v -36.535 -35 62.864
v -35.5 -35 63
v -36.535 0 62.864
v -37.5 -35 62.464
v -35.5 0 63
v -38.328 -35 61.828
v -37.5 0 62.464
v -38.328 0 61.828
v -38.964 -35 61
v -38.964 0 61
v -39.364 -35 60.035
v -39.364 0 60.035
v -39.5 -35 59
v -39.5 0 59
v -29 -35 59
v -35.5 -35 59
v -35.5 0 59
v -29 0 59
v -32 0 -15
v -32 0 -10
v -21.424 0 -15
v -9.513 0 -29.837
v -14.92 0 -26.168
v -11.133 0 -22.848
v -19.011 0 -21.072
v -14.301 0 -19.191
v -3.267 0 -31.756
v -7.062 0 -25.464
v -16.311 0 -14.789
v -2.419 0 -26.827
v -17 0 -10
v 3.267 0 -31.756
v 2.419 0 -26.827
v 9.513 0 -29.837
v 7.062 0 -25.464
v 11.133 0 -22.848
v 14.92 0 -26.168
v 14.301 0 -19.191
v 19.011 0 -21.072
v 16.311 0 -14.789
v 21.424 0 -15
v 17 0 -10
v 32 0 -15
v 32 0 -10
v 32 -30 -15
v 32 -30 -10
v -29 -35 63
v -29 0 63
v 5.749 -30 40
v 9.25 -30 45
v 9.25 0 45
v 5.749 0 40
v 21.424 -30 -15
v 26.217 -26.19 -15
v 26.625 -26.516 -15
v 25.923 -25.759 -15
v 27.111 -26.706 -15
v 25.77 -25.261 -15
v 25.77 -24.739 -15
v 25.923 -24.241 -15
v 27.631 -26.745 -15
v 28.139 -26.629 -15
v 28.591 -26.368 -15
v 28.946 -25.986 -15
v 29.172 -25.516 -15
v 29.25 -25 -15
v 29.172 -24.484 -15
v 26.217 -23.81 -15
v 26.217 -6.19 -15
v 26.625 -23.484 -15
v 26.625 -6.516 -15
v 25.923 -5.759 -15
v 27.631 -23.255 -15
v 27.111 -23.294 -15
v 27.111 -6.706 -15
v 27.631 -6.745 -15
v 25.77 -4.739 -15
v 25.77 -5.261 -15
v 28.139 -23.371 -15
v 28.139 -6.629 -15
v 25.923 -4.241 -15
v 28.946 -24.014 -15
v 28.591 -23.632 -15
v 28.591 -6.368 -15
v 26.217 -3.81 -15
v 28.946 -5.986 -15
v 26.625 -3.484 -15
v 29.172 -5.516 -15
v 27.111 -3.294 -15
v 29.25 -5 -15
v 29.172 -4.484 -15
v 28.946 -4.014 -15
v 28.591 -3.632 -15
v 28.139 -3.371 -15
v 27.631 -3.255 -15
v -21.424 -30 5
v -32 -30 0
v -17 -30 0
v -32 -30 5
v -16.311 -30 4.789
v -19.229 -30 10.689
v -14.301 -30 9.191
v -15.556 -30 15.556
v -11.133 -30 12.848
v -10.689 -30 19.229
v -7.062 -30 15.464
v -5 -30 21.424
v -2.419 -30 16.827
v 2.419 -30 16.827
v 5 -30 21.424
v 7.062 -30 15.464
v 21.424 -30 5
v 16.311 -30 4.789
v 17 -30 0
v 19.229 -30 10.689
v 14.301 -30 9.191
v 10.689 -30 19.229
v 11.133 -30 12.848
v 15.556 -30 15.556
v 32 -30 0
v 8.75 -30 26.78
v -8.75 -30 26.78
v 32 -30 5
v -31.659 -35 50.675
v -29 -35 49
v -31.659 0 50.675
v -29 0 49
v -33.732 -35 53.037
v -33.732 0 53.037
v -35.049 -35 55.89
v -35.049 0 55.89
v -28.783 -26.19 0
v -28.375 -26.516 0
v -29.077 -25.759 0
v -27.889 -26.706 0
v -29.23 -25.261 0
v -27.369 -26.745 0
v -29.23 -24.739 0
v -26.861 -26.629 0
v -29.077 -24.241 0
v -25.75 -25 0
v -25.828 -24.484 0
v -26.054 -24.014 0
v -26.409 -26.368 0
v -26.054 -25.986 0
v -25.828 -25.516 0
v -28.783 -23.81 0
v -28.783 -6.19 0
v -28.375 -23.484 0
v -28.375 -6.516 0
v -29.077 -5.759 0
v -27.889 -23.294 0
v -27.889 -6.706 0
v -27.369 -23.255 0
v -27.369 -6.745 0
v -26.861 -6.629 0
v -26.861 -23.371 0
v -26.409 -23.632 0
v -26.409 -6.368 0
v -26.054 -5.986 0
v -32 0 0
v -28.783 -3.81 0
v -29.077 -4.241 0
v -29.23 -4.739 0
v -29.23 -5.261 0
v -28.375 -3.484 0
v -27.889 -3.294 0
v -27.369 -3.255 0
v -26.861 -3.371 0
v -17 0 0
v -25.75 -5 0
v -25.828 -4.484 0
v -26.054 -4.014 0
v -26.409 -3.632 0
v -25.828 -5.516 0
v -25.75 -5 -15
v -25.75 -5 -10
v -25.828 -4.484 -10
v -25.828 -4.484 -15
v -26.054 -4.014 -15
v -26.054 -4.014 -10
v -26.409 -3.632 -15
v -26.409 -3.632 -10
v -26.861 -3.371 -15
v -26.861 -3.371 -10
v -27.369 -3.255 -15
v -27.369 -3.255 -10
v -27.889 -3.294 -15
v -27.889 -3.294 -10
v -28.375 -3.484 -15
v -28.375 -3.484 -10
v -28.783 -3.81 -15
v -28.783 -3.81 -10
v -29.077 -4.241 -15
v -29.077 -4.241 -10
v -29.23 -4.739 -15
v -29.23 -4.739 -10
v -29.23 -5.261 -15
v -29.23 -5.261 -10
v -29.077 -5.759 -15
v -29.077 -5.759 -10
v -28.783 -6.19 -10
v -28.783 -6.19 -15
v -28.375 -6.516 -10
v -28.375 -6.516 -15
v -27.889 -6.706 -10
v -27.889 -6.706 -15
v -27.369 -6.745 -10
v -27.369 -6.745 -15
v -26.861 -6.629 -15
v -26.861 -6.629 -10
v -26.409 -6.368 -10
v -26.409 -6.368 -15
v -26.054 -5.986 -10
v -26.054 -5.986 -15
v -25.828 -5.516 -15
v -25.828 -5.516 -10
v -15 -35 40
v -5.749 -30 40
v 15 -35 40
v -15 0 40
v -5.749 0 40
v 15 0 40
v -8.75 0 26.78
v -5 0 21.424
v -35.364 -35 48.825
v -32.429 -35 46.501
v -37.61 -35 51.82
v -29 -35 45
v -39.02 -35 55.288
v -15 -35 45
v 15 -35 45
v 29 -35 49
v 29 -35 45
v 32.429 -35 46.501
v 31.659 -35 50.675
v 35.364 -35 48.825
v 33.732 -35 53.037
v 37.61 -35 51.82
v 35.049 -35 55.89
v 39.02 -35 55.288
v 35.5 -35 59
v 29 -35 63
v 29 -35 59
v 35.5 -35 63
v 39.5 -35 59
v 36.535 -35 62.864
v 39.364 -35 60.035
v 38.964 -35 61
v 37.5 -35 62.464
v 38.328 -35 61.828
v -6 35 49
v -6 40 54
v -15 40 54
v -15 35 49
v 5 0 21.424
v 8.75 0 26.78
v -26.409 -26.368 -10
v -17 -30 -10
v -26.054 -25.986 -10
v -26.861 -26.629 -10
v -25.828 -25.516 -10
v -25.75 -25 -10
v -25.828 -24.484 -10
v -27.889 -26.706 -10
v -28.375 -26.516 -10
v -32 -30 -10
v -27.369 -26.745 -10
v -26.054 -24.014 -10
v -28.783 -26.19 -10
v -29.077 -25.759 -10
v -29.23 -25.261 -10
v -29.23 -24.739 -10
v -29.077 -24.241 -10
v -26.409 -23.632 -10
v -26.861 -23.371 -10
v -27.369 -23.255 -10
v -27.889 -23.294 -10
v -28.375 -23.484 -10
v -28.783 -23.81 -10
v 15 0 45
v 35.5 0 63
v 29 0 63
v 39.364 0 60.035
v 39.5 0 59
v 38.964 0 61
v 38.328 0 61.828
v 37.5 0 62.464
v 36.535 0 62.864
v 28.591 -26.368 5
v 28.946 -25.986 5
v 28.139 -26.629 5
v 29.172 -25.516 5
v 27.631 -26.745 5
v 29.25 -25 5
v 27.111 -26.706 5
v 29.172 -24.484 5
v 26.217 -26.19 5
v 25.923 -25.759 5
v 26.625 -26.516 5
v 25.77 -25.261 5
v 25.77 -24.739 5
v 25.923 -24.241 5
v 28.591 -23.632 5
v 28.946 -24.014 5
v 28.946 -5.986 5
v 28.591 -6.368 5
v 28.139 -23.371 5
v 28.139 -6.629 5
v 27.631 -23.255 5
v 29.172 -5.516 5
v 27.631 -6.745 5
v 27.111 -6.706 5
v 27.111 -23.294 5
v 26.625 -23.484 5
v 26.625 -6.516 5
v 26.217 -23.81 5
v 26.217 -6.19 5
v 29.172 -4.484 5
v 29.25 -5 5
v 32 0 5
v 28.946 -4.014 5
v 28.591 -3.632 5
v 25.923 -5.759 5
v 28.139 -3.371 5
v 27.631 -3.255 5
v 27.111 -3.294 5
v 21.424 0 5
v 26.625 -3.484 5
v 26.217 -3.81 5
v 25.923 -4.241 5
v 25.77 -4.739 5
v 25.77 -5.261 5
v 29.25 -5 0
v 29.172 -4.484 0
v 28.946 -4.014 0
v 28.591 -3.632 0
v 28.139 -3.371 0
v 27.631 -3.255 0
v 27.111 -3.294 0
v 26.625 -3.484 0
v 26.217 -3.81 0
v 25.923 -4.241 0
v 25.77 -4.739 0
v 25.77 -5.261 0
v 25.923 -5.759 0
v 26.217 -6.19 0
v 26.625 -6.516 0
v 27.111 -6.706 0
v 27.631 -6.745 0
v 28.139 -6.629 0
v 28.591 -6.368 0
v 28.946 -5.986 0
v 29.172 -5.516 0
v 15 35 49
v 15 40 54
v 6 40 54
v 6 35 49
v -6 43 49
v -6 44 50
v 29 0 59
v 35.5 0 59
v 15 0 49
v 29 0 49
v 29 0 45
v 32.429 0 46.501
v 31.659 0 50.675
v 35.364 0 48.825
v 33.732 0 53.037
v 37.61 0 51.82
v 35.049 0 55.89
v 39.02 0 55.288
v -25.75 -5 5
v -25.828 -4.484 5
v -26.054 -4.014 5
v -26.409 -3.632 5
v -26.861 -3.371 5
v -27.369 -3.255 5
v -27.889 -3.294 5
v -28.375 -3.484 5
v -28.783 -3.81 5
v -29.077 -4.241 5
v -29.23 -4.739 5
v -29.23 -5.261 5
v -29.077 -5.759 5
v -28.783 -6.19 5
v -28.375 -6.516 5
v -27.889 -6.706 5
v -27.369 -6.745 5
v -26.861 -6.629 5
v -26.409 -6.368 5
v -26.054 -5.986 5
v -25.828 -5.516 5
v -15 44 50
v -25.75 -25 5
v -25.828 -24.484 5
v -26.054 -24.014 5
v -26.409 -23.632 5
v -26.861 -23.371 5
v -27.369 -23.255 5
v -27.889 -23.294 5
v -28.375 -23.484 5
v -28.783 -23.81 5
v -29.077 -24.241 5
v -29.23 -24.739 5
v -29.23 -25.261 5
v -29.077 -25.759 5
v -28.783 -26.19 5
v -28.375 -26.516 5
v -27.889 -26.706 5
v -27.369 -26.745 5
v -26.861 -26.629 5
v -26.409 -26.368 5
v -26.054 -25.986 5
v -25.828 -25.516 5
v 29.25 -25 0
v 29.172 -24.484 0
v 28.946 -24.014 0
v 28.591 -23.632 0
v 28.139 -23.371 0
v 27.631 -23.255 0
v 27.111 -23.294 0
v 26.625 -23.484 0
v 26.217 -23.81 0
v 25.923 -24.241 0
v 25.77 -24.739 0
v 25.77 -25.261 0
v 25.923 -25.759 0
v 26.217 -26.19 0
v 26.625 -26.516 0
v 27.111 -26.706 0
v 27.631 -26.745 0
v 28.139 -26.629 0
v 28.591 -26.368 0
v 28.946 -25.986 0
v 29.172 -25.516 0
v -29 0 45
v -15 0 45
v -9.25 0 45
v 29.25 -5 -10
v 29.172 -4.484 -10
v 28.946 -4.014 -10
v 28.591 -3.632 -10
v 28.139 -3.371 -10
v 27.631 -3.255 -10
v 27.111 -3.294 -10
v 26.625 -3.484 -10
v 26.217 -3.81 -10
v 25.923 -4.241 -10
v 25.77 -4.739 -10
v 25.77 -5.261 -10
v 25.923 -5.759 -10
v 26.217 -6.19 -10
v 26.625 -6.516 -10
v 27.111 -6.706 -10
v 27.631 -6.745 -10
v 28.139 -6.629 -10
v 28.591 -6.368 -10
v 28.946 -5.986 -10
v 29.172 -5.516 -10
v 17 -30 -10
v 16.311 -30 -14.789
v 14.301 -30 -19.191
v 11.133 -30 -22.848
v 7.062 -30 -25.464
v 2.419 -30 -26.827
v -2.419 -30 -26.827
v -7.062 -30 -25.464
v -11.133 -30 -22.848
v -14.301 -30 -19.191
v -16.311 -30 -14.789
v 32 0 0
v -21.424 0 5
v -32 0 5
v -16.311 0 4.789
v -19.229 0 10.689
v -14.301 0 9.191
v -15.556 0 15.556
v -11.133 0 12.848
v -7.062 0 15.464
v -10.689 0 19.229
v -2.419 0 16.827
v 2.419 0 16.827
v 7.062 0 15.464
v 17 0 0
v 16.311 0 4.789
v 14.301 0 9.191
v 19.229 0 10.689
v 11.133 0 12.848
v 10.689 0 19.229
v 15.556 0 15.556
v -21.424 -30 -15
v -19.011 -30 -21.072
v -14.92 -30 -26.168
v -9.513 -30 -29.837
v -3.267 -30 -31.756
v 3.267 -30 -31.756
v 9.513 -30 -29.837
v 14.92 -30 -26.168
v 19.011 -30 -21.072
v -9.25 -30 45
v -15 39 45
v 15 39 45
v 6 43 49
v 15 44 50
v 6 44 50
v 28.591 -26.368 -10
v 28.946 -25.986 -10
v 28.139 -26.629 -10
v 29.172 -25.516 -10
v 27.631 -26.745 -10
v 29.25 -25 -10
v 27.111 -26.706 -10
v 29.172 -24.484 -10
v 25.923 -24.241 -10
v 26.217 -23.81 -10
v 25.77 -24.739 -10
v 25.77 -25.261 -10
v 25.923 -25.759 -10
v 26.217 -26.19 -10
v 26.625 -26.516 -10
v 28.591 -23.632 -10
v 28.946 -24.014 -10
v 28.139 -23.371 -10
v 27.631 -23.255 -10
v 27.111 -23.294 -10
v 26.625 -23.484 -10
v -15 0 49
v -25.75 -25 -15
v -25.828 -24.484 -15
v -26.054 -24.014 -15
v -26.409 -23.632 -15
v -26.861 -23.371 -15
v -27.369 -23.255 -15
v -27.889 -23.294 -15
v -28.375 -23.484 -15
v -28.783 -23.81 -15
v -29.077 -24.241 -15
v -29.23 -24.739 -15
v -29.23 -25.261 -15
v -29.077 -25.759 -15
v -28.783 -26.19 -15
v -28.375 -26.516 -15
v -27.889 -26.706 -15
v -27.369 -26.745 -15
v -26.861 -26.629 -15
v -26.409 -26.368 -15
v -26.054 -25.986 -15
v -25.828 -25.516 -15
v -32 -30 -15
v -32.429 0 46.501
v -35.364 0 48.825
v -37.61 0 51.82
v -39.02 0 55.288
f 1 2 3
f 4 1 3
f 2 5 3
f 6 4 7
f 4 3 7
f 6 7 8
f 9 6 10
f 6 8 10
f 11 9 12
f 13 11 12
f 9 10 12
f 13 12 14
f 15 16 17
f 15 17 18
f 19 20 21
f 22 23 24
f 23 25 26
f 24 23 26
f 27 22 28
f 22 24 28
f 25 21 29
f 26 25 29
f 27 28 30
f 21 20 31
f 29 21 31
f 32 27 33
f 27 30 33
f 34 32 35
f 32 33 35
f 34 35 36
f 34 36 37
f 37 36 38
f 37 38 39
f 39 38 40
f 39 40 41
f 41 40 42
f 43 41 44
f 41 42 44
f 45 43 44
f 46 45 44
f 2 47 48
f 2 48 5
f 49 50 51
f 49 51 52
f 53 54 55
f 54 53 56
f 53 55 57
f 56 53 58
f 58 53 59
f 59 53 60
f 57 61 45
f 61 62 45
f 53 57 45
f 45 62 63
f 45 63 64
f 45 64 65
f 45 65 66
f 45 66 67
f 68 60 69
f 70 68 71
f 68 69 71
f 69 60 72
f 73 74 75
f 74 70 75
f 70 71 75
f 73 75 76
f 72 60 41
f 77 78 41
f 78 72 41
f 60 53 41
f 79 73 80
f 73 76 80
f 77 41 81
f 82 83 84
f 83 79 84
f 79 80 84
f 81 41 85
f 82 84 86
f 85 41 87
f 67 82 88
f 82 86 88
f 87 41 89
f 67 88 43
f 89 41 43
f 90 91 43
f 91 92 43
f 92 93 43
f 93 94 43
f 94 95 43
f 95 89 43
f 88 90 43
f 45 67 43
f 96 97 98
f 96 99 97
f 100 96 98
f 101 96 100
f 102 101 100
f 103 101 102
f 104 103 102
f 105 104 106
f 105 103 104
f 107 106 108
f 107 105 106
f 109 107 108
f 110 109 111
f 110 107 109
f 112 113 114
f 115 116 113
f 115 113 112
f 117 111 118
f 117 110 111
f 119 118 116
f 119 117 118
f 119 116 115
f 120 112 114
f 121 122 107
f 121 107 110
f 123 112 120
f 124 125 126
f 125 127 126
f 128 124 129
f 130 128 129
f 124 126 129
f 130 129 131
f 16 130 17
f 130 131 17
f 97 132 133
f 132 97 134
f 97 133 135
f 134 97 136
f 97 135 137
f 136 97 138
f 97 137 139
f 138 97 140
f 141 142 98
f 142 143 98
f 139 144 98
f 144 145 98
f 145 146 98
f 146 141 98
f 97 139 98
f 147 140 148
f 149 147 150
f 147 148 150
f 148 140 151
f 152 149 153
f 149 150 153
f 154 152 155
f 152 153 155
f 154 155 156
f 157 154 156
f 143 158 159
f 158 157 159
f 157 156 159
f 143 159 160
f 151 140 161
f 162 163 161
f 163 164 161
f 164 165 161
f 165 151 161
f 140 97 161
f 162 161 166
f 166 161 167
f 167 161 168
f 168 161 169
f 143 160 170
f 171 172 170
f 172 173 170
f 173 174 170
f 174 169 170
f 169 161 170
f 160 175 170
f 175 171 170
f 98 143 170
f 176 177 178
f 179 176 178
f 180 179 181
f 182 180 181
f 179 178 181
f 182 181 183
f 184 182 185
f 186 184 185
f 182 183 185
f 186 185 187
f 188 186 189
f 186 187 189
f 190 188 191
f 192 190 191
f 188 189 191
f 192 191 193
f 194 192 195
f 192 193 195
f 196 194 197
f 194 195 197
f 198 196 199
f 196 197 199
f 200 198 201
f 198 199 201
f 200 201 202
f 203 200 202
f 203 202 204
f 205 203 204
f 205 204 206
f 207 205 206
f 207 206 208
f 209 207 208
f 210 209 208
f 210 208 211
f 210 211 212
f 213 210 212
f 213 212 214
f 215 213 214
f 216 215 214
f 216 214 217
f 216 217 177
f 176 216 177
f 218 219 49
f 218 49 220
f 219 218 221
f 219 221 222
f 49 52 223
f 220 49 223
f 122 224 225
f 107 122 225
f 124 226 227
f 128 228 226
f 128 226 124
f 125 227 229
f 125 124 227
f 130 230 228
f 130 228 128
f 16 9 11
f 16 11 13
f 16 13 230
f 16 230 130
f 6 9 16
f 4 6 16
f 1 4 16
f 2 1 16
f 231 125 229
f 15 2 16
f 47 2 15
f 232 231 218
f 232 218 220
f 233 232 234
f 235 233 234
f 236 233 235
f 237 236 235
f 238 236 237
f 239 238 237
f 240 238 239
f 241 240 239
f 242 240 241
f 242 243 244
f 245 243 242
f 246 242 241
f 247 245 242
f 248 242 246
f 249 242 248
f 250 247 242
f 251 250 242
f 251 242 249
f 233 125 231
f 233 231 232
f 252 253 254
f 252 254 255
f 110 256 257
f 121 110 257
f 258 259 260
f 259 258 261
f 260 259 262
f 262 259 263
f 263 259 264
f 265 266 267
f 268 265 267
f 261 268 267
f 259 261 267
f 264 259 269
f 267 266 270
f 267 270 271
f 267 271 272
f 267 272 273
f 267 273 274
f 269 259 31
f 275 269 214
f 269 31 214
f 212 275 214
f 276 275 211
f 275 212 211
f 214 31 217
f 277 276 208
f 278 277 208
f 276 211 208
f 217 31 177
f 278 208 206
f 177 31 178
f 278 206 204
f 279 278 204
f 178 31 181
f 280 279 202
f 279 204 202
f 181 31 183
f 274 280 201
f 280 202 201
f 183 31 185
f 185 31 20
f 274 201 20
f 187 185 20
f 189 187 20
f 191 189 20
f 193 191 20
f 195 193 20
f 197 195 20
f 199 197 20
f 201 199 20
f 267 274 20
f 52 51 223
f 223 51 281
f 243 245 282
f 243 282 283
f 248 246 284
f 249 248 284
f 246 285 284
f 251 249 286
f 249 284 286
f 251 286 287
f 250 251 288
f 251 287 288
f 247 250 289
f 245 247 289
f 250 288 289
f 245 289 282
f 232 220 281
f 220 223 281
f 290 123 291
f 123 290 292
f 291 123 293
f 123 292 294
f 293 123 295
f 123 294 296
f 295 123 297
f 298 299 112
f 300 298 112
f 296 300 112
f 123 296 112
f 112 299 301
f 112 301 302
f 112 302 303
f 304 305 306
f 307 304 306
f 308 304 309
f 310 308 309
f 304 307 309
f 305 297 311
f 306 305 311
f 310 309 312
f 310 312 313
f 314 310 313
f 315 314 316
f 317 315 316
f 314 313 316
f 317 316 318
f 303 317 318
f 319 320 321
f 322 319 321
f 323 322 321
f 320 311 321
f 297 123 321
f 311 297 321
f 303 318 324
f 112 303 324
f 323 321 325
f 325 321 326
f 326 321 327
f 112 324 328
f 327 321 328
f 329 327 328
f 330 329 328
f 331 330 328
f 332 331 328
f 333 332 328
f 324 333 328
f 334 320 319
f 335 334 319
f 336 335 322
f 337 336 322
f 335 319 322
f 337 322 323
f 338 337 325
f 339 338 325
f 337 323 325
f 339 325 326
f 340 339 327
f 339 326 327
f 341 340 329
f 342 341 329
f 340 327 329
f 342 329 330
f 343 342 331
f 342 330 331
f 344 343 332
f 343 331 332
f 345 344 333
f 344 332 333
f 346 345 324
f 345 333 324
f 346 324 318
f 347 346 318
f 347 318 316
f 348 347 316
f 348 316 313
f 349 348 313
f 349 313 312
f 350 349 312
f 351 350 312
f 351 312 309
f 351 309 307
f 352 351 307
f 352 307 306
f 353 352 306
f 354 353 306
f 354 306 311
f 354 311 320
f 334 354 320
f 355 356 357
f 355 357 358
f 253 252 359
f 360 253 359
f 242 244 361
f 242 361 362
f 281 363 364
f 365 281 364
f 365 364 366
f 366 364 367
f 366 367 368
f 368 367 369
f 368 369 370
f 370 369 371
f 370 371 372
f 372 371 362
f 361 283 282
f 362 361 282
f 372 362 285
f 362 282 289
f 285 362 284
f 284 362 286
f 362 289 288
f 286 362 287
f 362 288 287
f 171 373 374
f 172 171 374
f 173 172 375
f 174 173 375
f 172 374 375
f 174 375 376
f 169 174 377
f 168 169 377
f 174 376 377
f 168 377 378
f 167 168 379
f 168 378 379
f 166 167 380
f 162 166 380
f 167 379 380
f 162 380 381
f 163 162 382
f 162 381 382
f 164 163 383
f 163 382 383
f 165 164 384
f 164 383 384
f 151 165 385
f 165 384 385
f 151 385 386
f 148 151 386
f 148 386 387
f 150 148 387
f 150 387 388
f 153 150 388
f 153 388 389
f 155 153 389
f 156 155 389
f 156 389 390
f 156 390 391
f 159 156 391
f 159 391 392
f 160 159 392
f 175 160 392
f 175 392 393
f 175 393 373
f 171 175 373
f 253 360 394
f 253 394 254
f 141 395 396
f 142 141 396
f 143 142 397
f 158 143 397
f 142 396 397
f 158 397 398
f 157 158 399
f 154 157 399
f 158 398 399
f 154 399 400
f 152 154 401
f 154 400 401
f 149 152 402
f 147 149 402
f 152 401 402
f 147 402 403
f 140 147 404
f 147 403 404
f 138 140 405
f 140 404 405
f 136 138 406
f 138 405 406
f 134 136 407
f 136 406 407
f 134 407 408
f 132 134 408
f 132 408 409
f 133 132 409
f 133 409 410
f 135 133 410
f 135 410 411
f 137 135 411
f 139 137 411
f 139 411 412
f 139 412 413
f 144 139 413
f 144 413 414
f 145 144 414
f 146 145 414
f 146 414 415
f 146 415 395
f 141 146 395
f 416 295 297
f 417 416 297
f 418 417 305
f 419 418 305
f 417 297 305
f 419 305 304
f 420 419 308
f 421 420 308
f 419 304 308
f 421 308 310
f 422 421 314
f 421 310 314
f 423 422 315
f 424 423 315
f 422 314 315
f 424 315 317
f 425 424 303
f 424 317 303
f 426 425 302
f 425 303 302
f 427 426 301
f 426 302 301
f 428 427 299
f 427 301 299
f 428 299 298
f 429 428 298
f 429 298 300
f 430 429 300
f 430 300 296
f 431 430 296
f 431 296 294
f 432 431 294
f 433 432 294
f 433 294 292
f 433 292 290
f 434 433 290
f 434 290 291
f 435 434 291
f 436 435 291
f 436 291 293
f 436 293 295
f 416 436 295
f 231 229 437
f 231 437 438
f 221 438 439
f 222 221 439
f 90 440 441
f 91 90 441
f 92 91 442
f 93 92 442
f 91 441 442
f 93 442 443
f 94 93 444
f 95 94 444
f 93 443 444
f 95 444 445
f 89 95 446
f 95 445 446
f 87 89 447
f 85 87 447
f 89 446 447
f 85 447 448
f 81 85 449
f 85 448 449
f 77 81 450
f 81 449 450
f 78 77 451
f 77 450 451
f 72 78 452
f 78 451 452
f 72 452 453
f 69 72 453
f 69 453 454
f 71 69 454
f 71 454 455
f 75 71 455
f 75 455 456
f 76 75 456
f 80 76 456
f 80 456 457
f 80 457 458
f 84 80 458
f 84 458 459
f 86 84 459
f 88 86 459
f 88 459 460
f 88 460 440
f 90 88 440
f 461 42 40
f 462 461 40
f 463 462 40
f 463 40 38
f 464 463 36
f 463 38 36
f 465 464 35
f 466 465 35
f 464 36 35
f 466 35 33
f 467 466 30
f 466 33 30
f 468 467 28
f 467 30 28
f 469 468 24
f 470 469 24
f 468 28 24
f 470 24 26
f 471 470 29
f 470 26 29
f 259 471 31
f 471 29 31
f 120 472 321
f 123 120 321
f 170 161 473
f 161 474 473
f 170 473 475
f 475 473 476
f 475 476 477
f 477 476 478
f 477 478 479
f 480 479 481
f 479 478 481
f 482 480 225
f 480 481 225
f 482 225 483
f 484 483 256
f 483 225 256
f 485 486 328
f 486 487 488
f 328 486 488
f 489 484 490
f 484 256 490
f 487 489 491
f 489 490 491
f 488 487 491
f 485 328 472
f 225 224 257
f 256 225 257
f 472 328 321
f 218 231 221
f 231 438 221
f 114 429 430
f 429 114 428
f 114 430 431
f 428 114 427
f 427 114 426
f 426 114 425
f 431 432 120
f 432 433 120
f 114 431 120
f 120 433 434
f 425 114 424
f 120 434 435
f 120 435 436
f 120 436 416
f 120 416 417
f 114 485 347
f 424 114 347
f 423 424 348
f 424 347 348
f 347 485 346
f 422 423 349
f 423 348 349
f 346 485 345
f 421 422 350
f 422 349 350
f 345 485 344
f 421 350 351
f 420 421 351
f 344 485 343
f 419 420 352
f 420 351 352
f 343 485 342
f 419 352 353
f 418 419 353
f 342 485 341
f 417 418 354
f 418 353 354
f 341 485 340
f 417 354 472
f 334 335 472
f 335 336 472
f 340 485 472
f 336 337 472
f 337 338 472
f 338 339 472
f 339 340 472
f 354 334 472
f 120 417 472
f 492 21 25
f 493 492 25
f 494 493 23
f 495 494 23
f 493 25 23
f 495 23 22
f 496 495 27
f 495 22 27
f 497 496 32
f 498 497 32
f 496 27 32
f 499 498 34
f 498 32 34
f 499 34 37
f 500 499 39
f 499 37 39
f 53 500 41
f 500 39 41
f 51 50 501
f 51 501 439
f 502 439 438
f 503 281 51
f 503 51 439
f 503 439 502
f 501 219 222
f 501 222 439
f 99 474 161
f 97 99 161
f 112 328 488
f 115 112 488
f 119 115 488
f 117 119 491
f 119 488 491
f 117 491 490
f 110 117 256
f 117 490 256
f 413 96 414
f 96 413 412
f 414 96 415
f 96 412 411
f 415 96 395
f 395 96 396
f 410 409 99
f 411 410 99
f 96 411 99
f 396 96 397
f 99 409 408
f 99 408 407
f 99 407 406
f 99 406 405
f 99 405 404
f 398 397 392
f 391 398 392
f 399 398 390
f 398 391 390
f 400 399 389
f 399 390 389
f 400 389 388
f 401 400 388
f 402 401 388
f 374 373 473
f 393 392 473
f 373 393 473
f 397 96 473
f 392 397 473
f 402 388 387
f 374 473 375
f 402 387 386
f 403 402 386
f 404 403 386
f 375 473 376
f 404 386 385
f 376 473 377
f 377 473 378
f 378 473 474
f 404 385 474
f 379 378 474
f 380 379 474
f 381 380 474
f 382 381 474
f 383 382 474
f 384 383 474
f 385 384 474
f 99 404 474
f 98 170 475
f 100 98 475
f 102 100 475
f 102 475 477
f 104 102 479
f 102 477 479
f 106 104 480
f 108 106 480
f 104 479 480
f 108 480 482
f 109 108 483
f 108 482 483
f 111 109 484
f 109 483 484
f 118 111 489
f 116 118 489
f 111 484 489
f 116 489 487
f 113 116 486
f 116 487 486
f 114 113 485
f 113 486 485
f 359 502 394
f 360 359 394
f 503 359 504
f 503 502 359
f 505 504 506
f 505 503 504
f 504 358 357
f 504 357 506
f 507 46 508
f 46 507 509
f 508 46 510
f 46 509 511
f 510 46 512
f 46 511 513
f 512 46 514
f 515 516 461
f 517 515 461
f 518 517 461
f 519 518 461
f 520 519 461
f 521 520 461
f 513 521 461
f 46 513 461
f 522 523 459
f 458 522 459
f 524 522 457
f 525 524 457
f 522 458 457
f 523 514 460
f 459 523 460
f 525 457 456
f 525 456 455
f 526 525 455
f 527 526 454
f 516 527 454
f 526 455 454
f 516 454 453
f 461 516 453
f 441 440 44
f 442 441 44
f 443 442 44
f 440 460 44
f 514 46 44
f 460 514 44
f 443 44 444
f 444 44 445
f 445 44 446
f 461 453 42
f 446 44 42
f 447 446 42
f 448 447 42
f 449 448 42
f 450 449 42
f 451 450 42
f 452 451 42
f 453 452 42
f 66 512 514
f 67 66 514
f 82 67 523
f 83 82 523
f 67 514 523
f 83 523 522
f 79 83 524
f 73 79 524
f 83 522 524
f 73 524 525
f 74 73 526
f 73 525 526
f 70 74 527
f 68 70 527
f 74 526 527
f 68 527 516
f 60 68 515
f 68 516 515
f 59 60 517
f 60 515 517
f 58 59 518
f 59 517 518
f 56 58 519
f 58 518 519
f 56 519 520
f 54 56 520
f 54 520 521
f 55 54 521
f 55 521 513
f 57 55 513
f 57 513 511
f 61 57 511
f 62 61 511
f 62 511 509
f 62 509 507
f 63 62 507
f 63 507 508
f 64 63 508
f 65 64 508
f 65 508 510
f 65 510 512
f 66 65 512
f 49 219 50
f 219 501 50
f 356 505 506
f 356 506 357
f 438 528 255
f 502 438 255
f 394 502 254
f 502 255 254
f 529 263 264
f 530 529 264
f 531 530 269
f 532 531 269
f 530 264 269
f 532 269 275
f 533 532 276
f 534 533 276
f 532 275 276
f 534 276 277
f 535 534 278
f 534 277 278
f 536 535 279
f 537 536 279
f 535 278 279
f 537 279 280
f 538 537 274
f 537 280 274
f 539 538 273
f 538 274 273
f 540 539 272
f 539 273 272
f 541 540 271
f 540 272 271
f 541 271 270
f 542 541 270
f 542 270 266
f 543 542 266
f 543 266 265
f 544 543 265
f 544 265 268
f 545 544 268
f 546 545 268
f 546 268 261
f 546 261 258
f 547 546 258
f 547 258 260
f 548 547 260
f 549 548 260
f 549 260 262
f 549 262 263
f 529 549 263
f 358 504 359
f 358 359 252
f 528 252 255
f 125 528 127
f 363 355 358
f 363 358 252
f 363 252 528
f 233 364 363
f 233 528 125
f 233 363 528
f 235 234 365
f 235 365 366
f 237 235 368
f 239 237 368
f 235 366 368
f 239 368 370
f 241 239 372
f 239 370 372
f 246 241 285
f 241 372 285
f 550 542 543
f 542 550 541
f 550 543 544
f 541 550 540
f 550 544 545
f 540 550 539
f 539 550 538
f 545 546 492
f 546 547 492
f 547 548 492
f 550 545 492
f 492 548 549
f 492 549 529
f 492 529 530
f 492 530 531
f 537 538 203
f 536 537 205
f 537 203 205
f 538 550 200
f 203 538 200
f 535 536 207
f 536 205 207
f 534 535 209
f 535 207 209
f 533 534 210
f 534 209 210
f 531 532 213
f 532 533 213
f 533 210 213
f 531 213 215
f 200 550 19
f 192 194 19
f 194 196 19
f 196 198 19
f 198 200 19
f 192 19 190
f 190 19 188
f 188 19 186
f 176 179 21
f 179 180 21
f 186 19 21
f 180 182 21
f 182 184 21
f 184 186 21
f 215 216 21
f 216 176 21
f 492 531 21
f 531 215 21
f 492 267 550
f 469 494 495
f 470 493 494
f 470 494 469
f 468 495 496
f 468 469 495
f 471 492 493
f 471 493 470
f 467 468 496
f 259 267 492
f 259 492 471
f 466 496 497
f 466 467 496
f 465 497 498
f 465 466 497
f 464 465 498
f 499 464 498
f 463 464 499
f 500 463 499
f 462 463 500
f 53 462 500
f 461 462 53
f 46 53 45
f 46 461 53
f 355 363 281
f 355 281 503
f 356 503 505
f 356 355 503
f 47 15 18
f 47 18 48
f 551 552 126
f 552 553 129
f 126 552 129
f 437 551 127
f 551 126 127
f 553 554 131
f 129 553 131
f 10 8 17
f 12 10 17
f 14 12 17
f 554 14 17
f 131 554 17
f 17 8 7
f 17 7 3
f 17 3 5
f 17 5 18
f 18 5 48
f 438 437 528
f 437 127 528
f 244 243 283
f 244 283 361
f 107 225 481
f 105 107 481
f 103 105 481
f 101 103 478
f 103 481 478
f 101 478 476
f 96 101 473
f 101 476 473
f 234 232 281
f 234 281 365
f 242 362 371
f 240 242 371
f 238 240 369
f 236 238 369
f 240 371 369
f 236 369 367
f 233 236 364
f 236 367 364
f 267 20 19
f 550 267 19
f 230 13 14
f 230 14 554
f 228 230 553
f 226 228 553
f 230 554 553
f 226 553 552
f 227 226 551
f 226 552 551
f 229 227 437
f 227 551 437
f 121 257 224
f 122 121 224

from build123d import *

# Parameters (mm, degrees)
F3_DEPTH      = 30
F4_DEPTH      = 5
F6_DEPTH      = 15
F6_DEPTH_BACK = 15
F7_DEPTH      = 6
F8_DEPTH      = 30
F9_DEPTH      = 30
F10_R         = 1.75
F11_DEPTH     = 50


# Not quite as in the source:
# - a feature names something its author has since deleted; it is built from what else it names


with BuildPart() as f3:
    # F2 (on offset) → F3 (new body)
    with BuildSketch(Plane.XZ.offset(30)):
        with BuildLine():
            Line((29, 49), (-29, 49))
            ThreePointArc((-29, 49), (-33.7322003399, 53.0365697791), (-35.5, 59))
            Line((-35.5, 59), (-29, 59))
            Line((-29, 59), (-29, 63))
            Line((-29, 63), (-35.5, 63))
            ThreePointArc((-35.5, 63), (-38.3284271247, 61.8284271247), (-39.5, 59))
            ThreePointArc((-39.5, 59), (-36.5833333333, 50.25), (-29, 45))
            Line((-29, 45), (-15, 45))
            Line((-15, 45), (-15, 40))
            Line((-15, 40), (-5.748962309, 40))
            Line((-5.748962309, 40), (-9.25, 45))
            Line((-9.25, 45), (9.25, 45))
            Line((9.25, 45), (5.748962309, 40))
            Line((5.748962309, 40), (15, 40))
            Line((15, 40), (15, 45))
            Line((15, 45), (29, 45))
            ThreePointArc((29, 45), (36.5833333333, 50.25), (39.5, 59))
            ThreePointArc((39.5, 59), (38.3284271247, 61.8284271247), (35.5, 63))
            Line((35.5, 63), (29, 63))
            Line((29, 63), (29, 59))
            Line((29, 59), (35.5, 59))
            ThreePointArc((35.5, 59), (33.7322003399, 53.0365697791), (29, 49))
        make_face()
    extrude(amount=-F3_DEPTH)

    # F2 (on offset) → F4 (join)
    with BuildSketch(Plane.XZ.offset(30)):
        with BuildLine():
            Line((29, 49), (-29, 49))
            ThreePointArc((-29, 49), (-33.7322003399, 53.0365697791), (-35.5, 59))
            Line((-35.5, 59), (-29, 59))
            Line((-29, 59), (-29, 63))
            Line((-29, 63), (-35.5, 63))
            ThreePointArc((-35.5, 63), (-38.3284271247, 61.8284271247), (-39.5, 59))
            ThreePointArc((-39.5, 59), (-36.5833333333, 50.25), (-29, 45))
            Line((-29, 45), (-15, 45))
            Line((-15, 45), (-15, 40))
            Line((-15, 40), (-5.748962309, 40))
            Line((-5.748962309, 40), (-9.25, 45))
            Line((-9.25, 45), (9.25, 45))
            Line((9.25, 45), (5.748962309, 40))
            Line((5.748962309, 40), (15, 40))
            Line((15, 40), (15, 45))
            Line((15, 45), (29, 45))
            ThreePointArc((29, 45), (36.5833333333, 50.25), (39.5, 59))
            ThreePointArc((39.5, 59), (38.3284271247, 61.8284271247), (35.5, 63))
            Line((35.5, 63), (29, 63))
            Line((29, 63), (29, 59))
            Line((29, 59), (35.5, 59))
            ThreePointArc((35.5, 59), (33.7322003399, 53.0365697791), (29, 49))
        make_face()
        Polygon((-9.25, 45), (-5.748962309, 40), (5.748962309, 40), (9.25, 45), align=None)
    extrude(amount=F4_DEPTH)

    # F5 (on Right) → F6 (join, two sides)
    with BuildSketch(Plane.YZ) as f6_sk:
        Polygon((35, 49), (0, 49), (0, 45), (39, 45), (43, 49), align=None)
        Polygon((40, 54), (35, 49), (43, 49), (44, 50), align=None)
    extrude(amount=F6_DEPTH)
    extrude(f6_sk.sketch, amount=-F6_DEPTH_BACK)

    # F5 (on Right) → F7 (cut, symmetric)
    with BuildSketch(Plane.YZ):
        Polygon((40, 54), (35, 49), (43, 49), (44, 50), align=None)
    extrude(amount=F7_DEPTH, both=True, mode=Mode.SUBTRACT)


with BuildPart() as f8:
    # F0 (on Front) → F8 (new body)
    with BuildSketch(Plane.XZ):
        with BuildLine():
            Line((-32, 0), (-22, 0))
            ThreePointArc((-22, 0), (-21.8555974099, 2.516517804), (-21.4242852856, 5))
            Line((-21.4242852856, 5), (-32, 5))
            Line((-32, 5), (-32, 0))
        make_face()
        with BuildLine():
            Line((-22, 0), (-17, 0))
            Line((-17, 0), (-17, 5))
            Line((-17, 5), (-21.4242852856, 5))
            ThreePointArc((-21.4242852856, 5), (-21.8555974099, 2.516517804), (-22, 0))
        make_face()
        with BuildLine():
            ThreePointArc((-17, 0), (0, 17), (17, 0))
            Line((17, 0), (17, 5))
            Line((17, 5), (21.4242852856, 5))
            ThreePointArc((21.4242852856, 5), (15.5563491861, 15.5563491861), (5, 21.4242852856))
            ThreePointArc((5, 21.4242852856), (0, 22), (-5, 21.4242852856))
            ThreePointArc((-5, 21.4242852856), (-15.5563491861, 15.5563491861), (-21.4242852856, 5))
            Line((-21.4242852856, 5), (-17, 5))
            Line((-17, 5), (-17, 0))
        make_face()
        with BuildLine():
            Line((17, 5), (17, 0))
            Line((17, 0), (22, 0))
            ThreePointArc((22, 0), (21.8555974099, 2.516517804), (21.4242852856, 5))
            Line((21.4242852856, 5), (17, 5))
        make_face()
        with BuildLine():
            ThreePointArc((21.4242852856, 5), (21.8555974099, 2.516517804), (22, 0))
            Line((22, 0), (32, 0))
            Line((32, 0), (32, 5))
            Line((32, 5), (21.4242852856, 5))
        make_face()
        with BuildLine():
            ThreePointArc((-5, 21.4242852856), (0, 22), (5, 21.4242852856))
            Line((5, 21.4242852856), (8.75, 26.7798403109))
            Line((8.75, 26.7798403109), (-8.75, 26.7798403109))
            Line((-8.75, 26.7798403109), (-5, 21.4242852856))
        make_face()
    extrude(amount=F8_DEPTH)


with BuildPart() as f9:
    # F0 (on Front) → F9 (new body)
    with BuildSketch(Plane.XZ):
        with BuildLine():
            ThreePointArc((-21.4242852856, -15), (-21.8555974099, -12.516517804), (-22, -10))
            Line((-22, -10), (-32, -10))
            Line((-32, -10), (-32, -15))
            Line((-32, -15), (-21.4242852856, -15))
        make_face()
        with BuildLine():
            Line((-17, -15), (-17, -10))
            Line((-17, -10), (-22, -10))
            ThreePointArc((-22, -10), (-21.8555974099, -12.516517804), (-21.4242852856, -15))
            Line((-21.4242852856, -15), (-17, -15))
        make_face()
        with BuildLine():
            ThreePointArc((17, -10), (0, -27), (-17, -10))
            Line((-17, -10), (-17, -15))
            Line((-17, -15), (-21.4242852856, -15))
            ThreePointArc((-21.4242852856, -15), (0, -32), (21.4242852856, -15))
            Line((21.4242852856, -15), (17, -15))
            Line((17, -15), (17, -10))
        make_face()
        with BuildLine():
            Line((22, -10), (17, -10))
            Line((17, -10), (17, -15))
            Line((17, -15), (21.4242852856, -15))
            ThreePointArc((21.4242852856, -15), (21.8555974099, -12.516517804), (22, -10))
        make_face()
        with BuildLine():
            Line((32, -10), (22, -10))
            ThreePointArc((22, -10), (21.8555974099, -12.516517804), (21.4242852856, -15))
            Line((21.4242852856, -15), (32, -15))
            Line((32, -15), (32, -10))
        make_face()
    extrude(amount=F9_DEPTH)


with BuildPart() as f11_tool:
    # F10 (on face) → F11 (new body)
    with BuildSketch(Plane.XY.offset(5)):
        with Locations((-27.5, -25)):
            Circle(F10_R)
        with Locations((-27.5, -5)):
            Circle(F10_R)
        with Locations((27.5, -5)):
            Circle(F10_R)
        with Locations((27.5, -25)):
            Circle(F10_R)
    extrude(amount=-F11_DEPTH)


with BuildPart() as f8_1:
    add(f8.part)

    # F11: cut by f11_tool
    add(f11_tool.part, mode=Mode.SUBTRACT)


with BuildPart() as f9_1:
    add(f9.part)

    # F11: cut by f11_tool
    add(f11_tool.part, mode=Mode.SUBTRACT)


solid = Compound([f3.part, f8_1.part, f9_1.part])
